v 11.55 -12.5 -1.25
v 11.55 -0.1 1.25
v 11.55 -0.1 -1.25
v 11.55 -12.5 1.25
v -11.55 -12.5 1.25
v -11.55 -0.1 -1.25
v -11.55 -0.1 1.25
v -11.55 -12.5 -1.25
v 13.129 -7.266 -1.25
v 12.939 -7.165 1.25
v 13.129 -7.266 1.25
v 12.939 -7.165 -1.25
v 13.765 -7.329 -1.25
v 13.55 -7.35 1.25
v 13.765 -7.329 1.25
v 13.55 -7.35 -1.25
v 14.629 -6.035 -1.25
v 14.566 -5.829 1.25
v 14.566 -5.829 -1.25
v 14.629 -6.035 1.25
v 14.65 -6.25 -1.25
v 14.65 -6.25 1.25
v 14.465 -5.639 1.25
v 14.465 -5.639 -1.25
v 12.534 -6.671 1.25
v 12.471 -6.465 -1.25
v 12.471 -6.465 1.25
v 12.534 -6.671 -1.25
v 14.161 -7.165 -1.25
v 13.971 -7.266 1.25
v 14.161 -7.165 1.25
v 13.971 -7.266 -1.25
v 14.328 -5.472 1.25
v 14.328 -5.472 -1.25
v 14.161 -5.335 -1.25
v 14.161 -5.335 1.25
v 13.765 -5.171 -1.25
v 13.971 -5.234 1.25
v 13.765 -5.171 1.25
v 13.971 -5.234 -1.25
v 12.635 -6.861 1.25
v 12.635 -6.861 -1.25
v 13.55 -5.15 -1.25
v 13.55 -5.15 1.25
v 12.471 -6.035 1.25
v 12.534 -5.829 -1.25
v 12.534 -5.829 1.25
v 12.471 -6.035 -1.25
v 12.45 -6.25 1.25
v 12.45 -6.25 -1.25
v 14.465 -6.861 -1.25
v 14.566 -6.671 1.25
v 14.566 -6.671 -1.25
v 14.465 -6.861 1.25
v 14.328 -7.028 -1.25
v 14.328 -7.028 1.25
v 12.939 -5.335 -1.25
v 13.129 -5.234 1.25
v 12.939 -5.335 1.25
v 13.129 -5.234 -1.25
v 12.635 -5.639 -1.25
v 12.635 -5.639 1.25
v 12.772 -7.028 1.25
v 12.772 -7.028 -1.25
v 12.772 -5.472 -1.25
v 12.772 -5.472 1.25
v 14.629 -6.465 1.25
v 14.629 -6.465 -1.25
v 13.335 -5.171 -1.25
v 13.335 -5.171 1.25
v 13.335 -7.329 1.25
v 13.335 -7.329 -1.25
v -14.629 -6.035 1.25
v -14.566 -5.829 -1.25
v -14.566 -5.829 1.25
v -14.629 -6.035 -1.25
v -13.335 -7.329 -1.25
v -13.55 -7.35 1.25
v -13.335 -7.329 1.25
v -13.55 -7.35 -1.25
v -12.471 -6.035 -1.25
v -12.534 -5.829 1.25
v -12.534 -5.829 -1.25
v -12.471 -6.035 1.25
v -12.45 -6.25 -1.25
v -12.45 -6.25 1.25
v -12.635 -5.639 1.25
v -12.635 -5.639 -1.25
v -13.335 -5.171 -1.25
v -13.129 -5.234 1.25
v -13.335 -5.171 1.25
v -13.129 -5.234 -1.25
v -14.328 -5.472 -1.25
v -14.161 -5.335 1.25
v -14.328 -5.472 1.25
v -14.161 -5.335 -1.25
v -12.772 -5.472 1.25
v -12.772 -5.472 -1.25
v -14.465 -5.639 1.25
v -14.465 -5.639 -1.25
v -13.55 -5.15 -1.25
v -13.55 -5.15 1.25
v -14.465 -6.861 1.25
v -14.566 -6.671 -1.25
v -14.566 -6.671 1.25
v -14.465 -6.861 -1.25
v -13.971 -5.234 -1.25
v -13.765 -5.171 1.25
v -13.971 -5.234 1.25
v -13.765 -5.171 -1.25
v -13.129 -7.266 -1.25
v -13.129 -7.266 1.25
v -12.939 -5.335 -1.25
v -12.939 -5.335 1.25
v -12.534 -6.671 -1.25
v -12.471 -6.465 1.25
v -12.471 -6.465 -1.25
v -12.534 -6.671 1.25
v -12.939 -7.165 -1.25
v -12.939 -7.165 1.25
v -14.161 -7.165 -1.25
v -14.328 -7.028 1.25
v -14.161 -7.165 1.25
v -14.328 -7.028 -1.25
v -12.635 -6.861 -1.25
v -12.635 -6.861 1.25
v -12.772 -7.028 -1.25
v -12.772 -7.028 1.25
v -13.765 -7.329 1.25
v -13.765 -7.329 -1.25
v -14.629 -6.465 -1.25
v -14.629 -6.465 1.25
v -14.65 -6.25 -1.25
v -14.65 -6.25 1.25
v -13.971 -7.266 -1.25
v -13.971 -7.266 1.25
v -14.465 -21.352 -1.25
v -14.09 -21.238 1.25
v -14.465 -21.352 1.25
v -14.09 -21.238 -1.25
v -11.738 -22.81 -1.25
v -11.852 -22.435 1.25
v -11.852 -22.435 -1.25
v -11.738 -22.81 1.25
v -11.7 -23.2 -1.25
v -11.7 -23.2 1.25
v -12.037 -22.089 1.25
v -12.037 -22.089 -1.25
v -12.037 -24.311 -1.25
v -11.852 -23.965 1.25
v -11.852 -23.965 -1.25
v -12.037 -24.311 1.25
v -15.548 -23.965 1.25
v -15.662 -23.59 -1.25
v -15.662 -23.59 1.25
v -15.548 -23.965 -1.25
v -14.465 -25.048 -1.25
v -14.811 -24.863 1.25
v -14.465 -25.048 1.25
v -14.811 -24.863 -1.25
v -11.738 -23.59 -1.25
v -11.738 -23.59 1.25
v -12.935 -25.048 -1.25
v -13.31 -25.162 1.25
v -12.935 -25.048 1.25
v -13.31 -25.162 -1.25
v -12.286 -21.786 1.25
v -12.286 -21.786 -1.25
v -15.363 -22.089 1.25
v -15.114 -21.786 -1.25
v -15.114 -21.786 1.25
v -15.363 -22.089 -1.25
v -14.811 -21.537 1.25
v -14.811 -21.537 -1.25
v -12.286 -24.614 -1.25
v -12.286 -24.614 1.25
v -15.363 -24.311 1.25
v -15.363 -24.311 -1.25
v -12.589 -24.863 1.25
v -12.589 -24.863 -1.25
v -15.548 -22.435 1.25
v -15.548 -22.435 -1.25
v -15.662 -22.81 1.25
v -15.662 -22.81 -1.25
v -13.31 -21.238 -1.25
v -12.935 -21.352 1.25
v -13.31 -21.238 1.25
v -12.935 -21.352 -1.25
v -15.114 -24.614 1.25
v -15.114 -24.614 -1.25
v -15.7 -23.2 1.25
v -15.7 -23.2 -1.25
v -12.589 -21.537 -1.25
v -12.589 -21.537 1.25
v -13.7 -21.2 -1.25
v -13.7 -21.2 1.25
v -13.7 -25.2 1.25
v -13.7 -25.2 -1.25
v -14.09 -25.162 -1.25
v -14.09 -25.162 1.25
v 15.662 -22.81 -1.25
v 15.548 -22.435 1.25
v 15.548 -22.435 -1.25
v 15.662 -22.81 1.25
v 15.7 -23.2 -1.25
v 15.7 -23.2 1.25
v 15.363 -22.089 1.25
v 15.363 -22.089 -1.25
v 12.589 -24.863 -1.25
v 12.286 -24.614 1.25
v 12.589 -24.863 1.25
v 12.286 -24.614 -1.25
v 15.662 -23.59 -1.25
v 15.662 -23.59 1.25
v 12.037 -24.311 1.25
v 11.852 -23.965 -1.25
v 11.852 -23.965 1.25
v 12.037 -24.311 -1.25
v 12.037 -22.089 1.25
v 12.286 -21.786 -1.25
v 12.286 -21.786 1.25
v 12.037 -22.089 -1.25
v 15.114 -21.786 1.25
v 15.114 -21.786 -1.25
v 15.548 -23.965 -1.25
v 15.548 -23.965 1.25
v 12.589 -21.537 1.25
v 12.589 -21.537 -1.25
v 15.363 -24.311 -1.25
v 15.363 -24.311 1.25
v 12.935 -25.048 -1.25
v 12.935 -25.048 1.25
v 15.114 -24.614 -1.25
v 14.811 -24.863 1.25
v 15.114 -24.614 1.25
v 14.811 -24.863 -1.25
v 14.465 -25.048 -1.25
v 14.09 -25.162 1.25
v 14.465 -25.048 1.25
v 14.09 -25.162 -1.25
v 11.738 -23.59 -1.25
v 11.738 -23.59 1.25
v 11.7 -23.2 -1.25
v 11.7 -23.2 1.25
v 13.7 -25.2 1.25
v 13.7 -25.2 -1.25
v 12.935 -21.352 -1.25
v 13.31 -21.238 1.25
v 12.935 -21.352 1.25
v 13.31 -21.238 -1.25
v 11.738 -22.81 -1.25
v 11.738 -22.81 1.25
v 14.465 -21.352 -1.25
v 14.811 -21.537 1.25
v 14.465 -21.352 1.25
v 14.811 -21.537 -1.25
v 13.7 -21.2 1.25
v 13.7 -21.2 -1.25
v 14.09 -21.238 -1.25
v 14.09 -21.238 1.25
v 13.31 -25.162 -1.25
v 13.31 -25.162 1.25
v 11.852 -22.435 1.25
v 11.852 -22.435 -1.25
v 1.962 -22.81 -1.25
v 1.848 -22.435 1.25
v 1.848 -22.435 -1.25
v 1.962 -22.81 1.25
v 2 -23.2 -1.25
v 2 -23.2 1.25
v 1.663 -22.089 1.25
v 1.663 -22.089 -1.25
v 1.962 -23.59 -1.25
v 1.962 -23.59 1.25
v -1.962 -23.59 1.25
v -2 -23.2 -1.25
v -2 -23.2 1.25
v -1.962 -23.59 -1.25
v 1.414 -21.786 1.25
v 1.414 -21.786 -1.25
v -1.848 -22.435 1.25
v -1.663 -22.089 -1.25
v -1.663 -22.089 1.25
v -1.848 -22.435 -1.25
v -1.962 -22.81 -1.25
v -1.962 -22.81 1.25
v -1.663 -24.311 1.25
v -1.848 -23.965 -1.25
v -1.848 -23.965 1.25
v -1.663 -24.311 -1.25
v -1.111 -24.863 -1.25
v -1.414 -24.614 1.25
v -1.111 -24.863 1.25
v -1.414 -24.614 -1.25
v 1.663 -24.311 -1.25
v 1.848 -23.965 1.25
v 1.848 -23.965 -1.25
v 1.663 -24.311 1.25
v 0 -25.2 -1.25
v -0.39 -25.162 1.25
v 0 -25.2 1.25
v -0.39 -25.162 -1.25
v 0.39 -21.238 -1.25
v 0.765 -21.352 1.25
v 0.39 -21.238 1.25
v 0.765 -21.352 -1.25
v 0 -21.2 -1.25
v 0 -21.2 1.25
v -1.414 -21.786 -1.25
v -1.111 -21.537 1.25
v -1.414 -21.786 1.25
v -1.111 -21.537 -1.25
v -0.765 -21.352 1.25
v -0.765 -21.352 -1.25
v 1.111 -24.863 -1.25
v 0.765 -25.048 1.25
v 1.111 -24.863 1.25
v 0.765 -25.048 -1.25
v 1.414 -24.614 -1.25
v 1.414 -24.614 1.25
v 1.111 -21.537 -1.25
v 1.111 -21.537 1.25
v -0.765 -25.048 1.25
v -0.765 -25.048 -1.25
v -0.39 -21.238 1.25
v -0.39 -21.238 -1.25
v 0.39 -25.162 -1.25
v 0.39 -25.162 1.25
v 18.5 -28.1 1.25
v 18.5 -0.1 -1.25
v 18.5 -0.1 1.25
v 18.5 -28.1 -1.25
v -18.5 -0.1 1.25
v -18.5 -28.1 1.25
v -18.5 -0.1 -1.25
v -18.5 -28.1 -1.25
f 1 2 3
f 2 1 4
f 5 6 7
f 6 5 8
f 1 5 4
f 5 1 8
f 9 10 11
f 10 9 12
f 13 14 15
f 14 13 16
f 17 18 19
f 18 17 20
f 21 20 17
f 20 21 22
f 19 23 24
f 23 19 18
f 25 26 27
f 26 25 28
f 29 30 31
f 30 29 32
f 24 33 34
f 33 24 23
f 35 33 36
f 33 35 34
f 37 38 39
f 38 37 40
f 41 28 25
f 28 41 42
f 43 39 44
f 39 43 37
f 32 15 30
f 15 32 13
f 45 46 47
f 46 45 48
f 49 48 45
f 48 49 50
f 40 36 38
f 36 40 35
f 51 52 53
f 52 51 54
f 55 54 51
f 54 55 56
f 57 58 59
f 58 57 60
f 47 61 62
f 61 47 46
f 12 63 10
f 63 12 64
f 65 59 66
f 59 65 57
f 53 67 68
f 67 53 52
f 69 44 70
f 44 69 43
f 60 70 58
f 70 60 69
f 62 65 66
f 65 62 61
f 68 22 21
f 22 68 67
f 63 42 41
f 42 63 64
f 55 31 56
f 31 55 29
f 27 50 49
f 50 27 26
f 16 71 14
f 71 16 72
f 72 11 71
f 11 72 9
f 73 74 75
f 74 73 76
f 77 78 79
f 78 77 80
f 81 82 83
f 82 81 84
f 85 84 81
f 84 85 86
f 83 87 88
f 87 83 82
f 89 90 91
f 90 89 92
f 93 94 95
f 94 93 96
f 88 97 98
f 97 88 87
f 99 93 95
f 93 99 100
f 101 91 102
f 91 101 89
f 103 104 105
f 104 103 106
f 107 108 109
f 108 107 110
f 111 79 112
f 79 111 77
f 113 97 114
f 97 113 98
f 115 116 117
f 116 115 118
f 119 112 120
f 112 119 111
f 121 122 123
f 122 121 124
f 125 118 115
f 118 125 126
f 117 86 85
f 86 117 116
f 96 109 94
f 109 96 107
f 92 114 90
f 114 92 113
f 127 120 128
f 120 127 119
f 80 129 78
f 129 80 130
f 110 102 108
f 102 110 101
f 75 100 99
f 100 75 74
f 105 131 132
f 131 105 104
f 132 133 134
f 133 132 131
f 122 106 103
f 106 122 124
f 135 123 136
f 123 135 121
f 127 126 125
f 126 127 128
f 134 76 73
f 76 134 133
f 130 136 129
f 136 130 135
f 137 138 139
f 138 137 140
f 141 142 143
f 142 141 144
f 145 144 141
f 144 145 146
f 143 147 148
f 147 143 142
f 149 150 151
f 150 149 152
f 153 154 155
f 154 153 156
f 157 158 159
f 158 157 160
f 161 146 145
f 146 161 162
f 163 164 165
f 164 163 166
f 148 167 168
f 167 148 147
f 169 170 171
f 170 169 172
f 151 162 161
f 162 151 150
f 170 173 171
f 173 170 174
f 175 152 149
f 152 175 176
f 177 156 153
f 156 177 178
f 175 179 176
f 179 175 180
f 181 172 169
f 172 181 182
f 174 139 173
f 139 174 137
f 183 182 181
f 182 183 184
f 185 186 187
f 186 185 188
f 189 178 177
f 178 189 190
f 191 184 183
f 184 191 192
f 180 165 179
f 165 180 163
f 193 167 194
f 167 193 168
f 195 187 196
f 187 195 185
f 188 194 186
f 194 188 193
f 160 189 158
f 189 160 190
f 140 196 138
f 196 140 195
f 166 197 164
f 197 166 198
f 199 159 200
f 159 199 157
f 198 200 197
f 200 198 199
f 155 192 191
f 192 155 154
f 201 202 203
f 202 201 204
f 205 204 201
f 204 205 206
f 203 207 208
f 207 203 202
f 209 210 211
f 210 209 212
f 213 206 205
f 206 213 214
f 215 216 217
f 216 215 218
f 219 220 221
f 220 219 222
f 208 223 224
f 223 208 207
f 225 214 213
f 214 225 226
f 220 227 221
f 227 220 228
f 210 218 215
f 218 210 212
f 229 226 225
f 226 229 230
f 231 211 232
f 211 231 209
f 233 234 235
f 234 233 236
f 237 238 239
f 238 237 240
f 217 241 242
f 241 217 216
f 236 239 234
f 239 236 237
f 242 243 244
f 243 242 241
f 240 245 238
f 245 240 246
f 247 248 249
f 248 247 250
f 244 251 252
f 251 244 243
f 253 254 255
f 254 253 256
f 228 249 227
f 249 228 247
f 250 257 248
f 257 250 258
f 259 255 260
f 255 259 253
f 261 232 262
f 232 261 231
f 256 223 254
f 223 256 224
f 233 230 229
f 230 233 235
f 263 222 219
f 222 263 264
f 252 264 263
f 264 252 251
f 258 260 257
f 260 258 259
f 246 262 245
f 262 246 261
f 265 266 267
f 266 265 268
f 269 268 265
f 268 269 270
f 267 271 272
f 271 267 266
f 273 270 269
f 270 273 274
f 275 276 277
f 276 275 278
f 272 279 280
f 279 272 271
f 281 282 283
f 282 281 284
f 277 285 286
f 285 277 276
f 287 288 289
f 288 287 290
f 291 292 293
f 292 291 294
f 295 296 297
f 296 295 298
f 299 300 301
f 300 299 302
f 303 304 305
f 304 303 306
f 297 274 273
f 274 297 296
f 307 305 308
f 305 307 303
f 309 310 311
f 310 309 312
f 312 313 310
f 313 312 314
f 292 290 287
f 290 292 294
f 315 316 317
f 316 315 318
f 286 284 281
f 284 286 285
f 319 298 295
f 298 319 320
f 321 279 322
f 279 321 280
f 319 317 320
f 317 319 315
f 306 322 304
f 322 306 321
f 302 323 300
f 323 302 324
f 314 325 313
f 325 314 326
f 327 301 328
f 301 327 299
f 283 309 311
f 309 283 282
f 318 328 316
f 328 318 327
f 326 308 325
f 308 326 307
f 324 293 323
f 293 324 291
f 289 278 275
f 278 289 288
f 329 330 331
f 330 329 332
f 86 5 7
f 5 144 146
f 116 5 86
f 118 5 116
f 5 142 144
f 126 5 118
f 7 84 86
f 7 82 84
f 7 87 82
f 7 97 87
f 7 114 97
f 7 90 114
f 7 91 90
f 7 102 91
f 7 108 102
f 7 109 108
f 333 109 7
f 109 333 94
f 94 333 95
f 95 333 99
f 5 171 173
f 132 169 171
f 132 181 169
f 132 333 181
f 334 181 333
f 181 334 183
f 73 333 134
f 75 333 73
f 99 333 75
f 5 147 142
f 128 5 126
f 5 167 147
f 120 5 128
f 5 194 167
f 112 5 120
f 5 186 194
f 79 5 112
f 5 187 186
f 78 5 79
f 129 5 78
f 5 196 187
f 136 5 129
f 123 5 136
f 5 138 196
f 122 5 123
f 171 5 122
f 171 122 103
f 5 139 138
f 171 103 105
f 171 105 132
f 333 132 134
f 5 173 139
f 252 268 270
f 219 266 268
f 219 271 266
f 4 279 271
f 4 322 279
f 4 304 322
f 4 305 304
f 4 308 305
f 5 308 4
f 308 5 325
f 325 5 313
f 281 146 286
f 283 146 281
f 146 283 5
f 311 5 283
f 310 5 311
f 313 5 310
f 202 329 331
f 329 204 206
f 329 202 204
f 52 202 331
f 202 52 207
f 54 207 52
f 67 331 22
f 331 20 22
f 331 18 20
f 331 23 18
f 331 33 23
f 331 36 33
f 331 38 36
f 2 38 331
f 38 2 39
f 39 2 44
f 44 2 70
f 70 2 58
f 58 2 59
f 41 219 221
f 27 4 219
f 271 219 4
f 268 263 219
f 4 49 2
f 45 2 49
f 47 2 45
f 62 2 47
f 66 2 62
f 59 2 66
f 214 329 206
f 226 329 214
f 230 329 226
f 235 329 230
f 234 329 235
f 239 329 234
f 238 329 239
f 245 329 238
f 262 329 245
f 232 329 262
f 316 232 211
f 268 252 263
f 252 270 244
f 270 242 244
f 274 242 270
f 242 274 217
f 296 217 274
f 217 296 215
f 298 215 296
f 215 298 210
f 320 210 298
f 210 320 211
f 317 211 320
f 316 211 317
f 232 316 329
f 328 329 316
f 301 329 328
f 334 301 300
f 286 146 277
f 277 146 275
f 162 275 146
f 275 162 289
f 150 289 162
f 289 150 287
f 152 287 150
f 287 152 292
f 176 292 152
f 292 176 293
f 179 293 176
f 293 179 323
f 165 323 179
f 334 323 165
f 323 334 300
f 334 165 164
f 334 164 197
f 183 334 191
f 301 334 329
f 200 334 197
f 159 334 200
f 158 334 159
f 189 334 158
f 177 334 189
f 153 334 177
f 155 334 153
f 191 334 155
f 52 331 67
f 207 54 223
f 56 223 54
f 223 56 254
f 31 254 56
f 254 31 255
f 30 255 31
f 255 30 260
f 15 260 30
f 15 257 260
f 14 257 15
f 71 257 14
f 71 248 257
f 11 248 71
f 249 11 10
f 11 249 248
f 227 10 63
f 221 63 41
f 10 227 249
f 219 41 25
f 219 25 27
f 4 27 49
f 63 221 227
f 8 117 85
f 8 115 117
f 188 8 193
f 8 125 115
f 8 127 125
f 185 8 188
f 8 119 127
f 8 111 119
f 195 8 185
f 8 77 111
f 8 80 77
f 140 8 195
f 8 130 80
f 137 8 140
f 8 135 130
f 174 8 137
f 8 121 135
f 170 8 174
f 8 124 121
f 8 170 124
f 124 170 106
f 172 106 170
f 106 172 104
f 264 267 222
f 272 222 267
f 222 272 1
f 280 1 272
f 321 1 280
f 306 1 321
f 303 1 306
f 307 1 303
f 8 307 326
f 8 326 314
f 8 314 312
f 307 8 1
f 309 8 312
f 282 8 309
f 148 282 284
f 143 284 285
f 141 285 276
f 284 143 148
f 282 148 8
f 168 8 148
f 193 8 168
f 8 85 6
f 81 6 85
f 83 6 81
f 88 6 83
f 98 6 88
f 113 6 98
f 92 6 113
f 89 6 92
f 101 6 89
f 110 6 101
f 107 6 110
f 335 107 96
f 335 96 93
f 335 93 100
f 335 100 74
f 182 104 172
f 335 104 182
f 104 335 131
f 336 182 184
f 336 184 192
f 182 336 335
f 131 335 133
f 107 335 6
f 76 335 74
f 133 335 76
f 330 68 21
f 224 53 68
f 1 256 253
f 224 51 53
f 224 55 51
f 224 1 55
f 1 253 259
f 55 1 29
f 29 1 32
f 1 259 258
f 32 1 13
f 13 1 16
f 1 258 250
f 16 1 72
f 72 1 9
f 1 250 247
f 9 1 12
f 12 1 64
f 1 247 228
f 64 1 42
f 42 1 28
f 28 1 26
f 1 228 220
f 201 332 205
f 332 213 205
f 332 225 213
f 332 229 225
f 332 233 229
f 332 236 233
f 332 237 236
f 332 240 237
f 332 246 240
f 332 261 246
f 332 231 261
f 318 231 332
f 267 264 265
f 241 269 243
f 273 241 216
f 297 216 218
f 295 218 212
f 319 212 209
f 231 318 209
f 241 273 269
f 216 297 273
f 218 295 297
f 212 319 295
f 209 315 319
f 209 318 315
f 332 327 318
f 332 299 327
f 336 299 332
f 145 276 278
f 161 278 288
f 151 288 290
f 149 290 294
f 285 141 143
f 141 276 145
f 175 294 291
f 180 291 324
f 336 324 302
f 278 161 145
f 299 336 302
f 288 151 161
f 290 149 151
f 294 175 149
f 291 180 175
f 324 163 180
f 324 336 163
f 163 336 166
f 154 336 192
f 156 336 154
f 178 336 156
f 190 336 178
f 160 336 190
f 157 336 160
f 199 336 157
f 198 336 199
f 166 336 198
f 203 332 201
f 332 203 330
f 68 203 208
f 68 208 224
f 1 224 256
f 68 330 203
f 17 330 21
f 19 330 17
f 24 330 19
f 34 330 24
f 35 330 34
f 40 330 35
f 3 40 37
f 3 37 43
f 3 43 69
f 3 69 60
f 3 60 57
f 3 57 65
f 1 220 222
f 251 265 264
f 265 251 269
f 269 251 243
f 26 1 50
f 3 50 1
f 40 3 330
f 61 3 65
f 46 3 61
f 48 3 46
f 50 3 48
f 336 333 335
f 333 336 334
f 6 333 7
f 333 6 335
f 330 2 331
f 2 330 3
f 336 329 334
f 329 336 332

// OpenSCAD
SERVO_WIDTH = 23.1;
SERVO_HEIGHT = 12.5;
SERVO_SCREW = 2.2;
SERVO_SCREW_DISTANCE = 27.1;
MOUNT_WIDTH = 37;
MOUNT_HEIGHT = 28;
MOUNT_TICKNESS = 2.5;
MOUNT_SCREW = 4;


module servo() {
	$fn = 32;
	cube(size=[SERVO_WIDTH, SERVO_HEIGHT, MOUNT_TICKNESS + 0.1], center=true);
	translate([SERVO_SCREW_DISTANCE/2, 0, 0])
		cylinder(d=SERVO_SCREW, h=MOUNT_TICKNESS + 0.1, center=true);
	translate([-SERVO_SCREW_DISTANCE/2, 0, 0])
		cylinder(d=SERVO_SCREW, h=MOUNT_TICKNESS + 0.1, center=true);
}

module mountScrews() {
	$fn = 32;
	dist_x = MOUNT_WIDTH/2 - MOUNT_SCREW*1.2;
	dist_y = MOUNT_HEIGHT - MOUNT_SCREW*1.2;
	translate([-dist_x, -dist_y, 0])
		cylinder(d=MOUNT_SCREW, h=MOUNT_TICKNESS + 0.1, center=true);
	translate([dist_x, -dist_y, 0])
		cylinder(d=MOUNT_SCREW, h=MOUNT_TICKNESS + 0.1, center=true);
	translate([0, -dist_y, 0])
		cylinder(d=MOUNT_SCREW, h=MOUNT_TICKNESS + 0.1, center=true);
}

difference() {
	translate([0, -MOUNT_HEIGHT/2-0.1, 0])
		cube(size=[MOUNT_WIDTH, MOUNT_HEIGHT, MOUNT_TICKNESS], center=true);
	translate([0, -SERVO_HEIGHT/2, 0])
		servo();
	mountScrews();
}
